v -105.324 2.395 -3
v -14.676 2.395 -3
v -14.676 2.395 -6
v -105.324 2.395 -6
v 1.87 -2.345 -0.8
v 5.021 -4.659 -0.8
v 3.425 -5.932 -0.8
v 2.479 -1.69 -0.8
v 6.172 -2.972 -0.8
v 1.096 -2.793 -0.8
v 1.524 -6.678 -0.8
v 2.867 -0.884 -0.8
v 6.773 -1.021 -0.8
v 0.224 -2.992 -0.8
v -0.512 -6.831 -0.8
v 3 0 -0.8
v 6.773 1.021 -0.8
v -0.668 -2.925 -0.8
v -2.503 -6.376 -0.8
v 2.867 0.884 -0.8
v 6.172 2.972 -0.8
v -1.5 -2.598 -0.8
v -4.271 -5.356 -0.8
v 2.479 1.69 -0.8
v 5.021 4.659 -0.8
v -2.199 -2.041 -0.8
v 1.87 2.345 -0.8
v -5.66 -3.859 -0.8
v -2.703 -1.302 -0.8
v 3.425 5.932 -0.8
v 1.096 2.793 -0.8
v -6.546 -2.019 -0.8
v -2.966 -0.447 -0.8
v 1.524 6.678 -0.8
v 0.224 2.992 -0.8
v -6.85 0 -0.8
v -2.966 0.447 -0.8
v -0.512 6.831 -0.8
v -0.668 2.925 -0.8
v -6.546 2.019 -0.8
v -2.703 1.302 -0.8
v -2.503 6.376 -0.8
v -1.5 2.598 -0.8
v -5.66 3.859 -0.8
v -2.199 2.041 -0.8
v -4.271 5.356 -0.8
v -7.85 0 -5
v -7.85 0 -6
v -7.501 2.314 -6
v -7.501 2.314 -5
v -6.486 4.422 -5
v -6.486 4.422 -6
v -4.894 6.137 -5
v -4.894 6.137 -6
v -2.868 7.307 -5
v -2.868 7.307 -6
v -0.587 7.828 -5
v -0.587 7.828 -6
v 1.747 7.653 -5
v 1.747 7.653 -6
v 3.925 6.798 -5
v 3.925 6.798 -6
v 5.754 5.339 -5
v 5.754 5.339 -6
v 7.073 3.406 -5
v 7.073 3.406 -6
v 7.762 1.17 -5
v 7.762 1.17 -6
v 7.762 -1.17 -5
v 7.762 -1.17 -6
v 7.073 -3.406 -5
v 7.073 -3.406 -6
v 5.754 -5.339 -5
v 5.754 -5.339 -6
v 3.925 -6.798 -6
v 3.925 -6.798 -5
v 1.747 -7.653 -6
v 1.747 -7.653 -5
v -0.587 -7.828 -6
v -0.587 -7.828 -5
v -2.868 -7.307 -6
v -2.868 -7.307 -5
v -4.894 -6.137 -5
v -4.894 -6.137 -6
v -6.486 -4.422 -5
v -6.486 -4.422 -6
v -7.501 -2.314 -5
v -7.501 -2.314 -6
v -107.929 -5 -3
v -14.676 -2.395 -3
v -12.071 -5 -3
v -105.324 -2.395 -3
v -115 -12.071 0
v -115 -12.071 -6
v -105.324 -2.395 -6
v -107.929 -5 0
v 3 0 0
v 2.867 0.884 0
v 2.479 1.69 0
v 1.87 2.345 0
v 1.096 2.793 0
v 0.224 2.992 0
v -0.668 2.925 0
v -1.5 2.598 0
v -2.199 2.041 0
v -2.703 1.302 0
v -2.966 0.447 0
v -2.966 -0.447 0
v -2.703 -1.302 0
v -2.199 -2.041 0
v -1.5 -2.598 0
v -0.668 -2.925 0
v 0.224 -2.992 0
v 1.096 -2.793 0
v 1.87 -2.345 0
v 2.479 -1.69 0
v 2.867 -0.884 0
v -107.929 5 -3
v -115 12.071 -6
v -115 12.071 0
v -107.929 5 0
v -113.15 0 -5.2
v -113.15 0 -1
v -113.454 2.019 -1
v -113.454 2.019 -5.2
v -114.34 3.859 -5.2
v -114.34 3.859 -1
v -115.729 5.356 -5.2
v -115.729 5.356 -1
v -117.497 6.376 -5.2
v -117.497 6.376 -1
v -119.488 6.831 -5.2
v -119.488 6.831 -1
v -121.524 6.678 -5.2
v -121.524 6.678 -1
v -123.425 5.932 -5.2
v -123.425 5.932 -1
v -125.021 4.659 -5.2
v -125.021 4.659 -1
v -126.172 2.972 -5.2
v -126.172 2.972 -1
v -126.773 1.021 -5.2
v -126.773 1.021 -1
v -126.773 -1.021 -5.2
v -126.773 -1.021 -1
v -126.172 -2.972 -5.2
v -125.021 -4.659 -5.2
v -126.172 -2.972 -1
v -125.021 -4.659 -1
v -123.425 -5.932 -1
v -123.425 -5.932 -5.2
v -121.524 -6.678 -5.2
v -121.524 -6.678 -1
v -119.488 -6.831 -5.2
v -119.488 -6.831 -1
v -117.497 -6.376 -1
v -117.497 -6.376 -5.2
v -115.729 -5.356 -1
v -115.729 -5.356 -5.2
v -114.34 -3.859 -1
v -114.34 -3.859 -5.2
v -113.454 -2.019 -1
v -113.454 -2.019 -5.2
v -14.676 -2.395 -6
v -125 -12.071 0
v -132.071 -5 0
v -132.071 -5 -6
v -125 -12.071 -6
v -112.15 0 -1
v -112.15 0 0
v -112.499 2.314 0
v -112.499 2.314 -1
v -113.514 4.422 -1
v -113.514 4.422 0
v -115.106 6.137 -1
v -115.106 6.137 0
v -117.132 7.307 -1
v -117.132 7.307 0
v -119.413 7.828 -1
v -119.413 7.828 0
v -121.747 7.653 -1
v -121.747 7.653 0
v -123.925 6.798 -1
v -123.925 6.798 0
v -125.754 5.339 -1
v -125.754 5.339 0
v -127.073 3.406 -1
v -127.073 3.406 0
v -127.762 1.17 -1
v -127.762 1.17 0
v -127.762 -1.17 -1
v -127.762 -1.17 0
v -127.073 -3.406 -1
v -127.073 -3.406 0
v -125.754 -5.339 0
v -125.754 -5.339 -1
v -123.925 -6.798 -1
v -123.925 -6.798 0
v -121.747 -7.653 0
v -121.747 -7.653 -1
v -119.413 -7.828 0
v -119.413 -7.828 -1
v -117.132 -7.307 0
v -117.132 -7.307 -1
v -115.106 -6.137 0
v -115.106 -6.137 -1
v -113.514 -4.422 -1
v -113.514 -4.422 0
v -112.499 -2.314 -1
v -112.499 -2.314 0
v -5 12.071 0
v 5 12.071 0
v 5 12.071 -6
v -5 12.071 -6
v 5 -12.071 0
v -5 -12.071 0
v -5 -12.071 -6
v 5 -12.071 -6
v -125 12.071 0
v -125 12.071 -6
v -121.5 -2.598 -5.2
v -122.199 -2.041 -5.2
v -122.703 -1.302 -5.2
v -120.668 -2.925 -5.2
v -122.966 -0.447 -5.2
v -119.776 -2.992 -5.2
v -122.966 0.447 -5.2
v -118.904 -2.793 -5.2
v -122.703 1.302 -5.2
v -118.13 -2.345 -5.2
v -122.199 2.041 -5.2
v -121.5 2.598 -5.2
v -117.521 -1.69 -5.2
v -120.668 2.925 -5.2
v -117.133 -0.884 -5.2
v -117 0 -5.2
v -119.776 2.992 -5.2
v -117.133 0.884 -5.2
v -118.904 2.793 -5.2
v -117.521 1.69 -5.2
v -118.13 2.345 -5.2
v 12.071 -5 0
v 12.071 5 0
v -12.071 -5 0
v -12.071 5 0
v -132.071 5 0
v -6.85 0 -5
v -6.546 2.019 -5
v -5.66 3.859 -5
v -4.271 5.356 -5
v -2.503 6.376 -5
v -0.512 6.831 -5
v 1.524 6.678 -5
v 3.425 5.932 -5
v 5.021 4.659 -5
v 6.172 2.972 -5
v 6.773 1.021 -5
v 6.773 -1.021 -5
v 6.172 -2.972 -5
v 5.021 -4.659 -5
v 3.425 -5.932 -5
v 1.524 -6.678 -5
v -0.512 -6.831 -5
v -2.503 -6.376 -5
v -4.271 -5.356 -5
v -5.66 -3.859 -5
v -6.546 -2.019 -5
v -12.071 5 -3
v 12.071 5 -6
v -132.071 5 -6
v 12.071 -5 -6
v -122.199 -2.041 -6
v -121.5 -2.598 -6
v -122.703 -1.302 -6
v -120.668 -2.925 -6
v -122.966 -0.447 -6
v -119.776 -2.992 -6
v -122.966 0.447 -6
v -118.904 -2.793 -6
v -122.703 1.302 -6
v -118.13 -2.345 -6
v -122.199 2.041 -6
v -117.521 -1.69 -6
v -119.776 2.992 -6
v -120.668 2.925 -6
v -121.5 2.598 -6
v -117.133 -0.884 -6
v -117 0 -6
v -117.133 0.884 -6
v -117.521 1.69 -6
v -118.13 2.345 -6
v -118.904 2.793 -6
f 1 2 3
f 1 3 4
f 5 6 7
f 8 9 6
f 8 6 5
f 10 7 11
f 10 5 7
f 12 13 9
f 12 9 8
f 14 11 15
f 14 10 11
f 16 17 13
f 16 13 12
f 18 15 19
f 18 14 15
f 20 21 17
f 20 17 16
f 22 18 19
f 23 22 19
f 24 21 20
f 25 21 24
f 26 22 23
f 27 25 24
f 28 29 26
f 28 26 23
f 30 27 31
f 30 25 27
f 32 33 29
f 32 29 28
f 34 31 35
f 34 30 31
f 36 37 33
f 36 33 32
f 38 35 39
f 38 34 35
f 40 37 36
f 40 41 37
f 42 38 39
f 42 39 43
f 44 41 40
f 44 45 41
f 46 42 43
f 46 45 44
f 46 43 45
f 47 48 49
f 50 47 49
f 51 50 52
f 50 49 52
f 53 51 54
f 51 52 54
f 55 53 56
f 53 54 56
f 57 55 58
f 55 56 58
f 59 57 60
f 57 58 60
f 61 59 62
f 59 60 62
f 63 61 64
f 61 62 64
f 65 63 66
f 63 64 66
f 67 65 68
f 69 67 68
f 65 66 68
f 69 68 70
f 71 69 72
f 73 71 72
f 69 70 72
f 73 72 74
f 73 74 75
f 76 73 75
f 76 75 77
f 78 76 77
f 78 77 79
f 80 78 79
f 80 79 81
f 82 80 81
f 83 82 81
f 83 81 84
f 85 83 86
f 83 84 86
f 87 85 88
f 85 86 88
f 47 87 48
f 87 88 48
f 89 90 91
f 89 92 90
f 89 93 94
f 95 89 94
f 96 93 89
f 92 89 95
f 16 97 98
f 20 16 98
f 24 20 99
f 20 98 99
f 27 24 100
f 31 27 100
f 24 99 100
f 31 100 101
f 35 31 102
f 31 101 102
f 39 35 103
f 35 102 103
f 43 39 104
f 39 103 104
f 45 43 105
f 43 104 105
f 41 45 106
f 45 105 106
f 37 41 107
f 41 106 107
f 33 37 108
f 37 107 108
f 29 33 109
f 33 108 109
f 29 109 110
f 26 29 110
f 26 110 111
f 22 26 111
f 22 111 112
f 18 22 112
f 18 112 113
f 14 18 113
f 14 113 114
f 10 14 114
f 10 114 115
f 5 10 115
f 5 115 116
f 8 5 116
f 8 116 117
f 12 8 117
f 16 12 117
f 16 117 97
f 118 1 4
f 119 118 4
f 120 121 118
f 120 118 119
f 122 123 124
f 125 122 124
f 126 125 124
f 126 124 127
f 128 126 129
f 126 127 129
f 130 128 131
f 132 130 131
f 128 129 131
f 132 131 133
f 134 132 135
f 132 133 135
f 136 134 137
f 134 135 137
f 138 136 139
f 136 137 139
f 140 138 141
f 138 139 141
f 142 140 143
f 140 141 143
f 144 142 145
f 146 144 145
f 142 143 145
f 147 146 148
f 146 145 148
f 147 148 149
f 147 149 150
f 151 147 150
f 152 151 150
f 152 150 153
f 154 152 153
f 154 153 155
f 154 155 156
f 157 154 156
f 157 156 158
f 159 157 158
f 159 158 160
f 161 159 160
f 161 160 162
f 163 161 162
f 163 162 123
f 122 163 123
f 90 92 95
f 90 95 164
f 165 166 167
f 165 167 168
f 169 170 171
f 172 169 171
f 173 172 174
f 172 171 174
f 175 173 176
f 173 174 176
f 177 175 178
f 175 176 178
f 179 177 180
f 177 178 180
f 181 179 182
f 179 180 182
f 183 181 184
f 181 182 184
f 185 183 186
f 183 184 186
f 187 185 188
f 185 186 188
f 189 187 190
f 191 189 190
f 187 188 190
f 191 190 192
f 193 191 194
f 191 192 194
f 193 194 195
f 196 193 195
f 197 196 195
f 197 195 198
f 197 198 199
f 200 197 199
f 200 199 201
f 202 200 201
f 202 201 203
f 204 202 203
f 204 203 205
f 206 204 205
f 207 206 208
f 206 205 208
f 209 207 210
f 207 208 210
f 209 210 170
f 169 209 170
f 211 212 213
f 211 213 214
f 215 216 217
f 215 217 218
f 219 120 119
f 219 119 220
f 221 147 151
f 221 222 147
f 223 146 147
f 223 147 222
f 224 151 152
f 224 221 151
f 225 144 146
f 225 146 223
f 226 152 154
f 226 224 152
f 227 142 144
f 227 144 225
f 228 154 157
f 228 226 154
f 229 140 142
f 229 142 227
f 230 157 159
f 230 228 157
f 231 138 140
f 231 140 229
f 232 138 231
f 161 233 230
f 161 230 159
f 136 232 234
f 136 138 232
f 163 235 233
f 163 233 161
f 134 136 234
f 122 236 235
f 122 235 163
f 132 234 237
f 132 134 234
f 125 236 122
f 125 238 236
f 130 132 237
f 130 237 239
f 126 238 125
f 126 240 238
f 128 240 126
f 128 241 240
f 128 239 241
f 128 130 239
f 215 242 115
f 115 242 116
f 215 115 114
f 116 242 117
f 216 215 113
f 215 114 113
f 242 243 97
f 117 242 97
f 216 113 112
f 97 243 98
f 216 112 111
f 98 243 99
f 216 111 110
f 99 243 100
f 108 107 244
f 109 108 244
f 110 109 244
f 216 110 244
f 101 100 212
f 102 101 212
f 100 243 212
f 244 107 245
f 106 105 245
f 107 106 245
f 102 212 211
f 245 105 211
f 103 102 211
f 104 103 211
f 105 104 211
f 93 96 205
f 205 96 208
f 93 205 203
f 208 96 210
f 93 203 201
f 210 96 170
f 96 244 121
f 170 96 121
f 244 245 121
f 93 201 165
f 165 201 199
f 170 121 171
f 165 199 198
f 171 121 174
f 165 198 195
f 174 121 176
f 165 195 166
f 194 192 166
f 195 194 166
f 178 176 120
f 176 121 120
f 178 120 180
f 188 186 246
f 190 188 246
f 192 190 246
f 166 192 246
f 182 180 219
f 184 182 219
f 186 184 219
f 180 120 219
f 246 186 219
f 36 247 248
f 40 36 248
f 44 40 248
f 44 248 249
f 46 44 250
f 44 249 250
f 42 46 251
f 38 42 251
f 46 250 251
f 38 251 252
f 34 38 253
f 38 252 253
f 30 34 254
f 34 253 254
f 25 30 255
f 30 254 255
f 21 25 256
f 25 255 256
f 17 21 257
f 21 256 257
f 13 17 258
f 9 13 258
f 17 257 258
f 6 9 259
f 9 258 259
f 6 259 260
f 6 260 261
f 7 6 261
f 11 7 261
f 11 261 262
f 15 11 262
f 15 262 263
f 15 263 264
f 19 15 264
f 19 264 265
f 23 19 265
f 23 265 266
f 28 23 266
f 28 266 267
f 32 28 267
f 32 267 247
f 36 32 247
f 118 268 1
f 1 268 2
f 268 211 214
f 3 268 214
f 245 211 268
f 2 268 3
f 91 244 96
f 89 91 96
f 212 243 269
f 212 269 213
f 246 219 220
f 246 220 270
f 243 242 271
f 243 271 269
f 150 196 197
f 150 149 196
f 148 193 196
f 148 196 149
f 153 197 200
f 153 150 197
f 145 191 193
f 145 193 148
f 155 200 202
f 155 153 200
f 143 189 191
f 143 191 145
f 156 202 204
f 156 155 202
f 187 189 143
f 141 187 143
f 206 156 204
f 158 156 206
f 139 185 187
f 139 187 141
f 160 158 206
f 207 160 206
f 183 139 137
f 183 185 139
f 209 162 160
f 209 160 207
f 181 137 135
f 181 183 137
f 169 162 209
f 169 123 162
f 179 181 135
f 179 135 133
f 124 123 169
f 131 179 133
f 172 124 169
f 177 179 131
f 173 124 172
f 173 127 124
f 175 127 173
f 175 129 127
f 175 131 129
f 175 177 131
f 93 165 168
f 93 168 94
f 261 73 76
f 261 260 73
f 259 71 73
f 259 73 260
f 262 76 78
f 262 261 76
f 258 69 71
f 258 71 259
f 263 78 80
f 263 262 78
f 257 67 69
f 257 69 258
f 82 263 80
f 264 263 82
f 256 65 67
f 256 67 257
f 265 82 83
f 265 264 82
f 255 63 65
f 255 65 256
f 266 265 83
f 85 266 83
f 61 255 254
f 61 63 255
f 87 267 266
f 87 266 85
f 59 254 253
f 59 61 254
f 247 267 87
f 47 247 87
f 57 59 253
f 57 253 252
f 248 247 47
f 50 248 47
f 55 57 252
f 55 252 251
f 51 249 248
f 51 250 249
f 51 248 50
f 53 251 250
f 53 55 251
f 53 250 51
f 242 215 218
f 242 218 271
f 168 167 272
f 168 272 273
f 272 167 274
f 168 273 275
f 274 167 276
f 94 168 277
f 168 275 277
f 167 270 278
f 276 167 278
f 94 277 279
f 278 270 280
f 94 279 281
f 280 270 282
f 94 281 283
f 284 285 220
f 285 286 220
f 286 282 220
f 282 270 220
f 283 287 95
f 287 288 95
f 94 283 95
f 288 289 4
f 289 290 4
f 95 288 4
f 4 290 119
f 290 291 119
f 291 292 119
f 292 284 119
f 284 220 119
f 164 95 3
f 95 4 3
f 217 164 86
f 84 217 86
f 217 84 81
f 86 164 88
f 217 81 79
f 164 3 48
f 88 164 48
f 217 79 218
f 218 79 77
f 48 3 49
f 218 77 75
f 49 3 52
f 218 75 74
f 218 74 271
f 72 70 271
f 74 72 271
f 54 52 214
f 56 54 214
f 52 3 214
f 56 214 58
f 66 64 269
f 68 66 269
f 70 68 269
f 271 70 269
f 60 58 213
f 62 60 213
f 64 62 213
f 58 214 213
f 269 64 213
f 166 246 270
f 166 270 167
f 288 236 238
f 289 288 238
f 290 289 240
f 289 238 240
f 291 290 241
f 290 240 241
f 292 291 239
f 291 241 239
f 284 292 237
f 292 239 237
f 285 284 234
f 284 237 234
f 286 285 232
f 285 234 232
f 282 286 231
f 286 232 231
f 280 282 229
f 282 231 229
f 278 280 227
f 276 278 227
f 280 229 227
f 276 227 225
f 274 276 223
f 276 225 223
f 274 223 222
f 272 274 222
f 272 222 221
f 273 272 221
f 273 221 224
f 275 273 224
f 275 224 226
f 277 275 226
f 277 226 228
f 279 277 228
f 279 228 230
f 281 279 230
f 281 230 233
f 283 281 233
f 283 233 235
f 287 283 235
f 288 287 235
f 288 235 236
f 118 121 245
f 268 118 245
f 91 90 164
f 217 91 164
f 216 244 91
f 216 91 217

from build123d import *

# Parameters (mm, degrees)
SKETCH1_R           = 3
BOSS_EXTRUDE1_DEPTH = 6
BOSS_EXTRUDE2_DEPTH = 3
SKETCH3_R           = 6.85
CUT_EXTRUDE1_DEPTH  = 5.2
SKETCH4_R           = 7.85
CUT_EXTRUDE2_DEPTH  = 1
SKETCH5_R           = 6.85
CUT_EXTRUDE3_DEPTH  = 5.2
SKETCH6_R           = 7.85
CUT_EXTRUDE4_DEPTH  = 1


with BuildPart() as part:
    # Sketch1 → Boss-Extrude1 (new body)
    with BuildSketch(Plane.XY):
        Polygon((12.071067812, 5), (5, 12.071067812), (-5, 12.071067812), (-12.071067812, 5), (-14.676359397, 2.394708415), (-105.323640603, 2.394708415), (-107.928932188, 5), (-115, 12.071067812), (-125, 12.071067812), (-132.071067812, 5), (-132.071067812, -5), (-125, -12.071067812), (-115, -12.071067812), (-107.928932188, -5), (-105.323640603, -2.394708415), (-14.676359397, -2.394708415), (-12.071067812, -5), (-5, -12.071067812), (5, -12.071067812), (12.071067812, -5), align=None)
        with Locations((-120, 0)):
            Circle(SKETCH1_R, mode=Mode.SUBTRACT)
        Circle(SKETCH1_R, mode=Mode.SUBTRACT)
    extrude(amount=-BOSS_EXTRUDE1_DEPTH)

    # Sketch2 → Boss-Extrude2 (add)
    with BuildSketch(Plane.XY):
        Polygon((-14.676359397, -2.394708415), (-12.071067812, -5), (-107.928932188, -5), (-105.323640603, -2.394708415), align=None)
        Polygon((-14.676359397, 2.394708415), (-105.323640603, 2.394708415), (-107.928932188, 5), (-12.071067812, 5), align=None)
    extrude(amount=-BOSS_EXTRUDE2_DEPTH)

    # Sketch3 → Cut-Extrude1 (cut)
    with BuildSketch(Plane(origin=(0, 0, -6), x_dir=(-1, 0, 0), z_dir=(0, 0, -1))):
        Circle(SKETCH3_R)
    extrude(amount=-CUT_EXTRUDE1_DEPTH, mode=Mode.SUBTRACT)

    # Sketch4 → Cut-Extrude2 (cut)
    with BuildSketch(Plane(origin=(0, 0, -6), x_dir=(-1, 0, 0), z_dir=(0, 0, -1))):
        Circle(SKETCH4_R)
    extrude(amount=-CUT_EXTRUDE2_DEPTH, mode=Mode.SUBTRACT)

    # Sketch5 → Cut-Extrude3 (cut)
    with BuildSketch(Plane.XY):
        with Locations((-120, 0)):
            Circle(SKETCH5_R)
    extrude(amount=-CUT_EXTRUDE3_DEPTH, mode=Mode.SUBTRACT)

    # Sketch6 → Cut-Extrude4 (cut)
    with BuildSketch(Plane.XY):
        with Locations((-120, 0)):
            Circle(SKETCH6_R)
    extrude(amount=-CUT_EXTRUDE4_DEPTH, mode=Mode.SUBTRACT)


solid = part.part
